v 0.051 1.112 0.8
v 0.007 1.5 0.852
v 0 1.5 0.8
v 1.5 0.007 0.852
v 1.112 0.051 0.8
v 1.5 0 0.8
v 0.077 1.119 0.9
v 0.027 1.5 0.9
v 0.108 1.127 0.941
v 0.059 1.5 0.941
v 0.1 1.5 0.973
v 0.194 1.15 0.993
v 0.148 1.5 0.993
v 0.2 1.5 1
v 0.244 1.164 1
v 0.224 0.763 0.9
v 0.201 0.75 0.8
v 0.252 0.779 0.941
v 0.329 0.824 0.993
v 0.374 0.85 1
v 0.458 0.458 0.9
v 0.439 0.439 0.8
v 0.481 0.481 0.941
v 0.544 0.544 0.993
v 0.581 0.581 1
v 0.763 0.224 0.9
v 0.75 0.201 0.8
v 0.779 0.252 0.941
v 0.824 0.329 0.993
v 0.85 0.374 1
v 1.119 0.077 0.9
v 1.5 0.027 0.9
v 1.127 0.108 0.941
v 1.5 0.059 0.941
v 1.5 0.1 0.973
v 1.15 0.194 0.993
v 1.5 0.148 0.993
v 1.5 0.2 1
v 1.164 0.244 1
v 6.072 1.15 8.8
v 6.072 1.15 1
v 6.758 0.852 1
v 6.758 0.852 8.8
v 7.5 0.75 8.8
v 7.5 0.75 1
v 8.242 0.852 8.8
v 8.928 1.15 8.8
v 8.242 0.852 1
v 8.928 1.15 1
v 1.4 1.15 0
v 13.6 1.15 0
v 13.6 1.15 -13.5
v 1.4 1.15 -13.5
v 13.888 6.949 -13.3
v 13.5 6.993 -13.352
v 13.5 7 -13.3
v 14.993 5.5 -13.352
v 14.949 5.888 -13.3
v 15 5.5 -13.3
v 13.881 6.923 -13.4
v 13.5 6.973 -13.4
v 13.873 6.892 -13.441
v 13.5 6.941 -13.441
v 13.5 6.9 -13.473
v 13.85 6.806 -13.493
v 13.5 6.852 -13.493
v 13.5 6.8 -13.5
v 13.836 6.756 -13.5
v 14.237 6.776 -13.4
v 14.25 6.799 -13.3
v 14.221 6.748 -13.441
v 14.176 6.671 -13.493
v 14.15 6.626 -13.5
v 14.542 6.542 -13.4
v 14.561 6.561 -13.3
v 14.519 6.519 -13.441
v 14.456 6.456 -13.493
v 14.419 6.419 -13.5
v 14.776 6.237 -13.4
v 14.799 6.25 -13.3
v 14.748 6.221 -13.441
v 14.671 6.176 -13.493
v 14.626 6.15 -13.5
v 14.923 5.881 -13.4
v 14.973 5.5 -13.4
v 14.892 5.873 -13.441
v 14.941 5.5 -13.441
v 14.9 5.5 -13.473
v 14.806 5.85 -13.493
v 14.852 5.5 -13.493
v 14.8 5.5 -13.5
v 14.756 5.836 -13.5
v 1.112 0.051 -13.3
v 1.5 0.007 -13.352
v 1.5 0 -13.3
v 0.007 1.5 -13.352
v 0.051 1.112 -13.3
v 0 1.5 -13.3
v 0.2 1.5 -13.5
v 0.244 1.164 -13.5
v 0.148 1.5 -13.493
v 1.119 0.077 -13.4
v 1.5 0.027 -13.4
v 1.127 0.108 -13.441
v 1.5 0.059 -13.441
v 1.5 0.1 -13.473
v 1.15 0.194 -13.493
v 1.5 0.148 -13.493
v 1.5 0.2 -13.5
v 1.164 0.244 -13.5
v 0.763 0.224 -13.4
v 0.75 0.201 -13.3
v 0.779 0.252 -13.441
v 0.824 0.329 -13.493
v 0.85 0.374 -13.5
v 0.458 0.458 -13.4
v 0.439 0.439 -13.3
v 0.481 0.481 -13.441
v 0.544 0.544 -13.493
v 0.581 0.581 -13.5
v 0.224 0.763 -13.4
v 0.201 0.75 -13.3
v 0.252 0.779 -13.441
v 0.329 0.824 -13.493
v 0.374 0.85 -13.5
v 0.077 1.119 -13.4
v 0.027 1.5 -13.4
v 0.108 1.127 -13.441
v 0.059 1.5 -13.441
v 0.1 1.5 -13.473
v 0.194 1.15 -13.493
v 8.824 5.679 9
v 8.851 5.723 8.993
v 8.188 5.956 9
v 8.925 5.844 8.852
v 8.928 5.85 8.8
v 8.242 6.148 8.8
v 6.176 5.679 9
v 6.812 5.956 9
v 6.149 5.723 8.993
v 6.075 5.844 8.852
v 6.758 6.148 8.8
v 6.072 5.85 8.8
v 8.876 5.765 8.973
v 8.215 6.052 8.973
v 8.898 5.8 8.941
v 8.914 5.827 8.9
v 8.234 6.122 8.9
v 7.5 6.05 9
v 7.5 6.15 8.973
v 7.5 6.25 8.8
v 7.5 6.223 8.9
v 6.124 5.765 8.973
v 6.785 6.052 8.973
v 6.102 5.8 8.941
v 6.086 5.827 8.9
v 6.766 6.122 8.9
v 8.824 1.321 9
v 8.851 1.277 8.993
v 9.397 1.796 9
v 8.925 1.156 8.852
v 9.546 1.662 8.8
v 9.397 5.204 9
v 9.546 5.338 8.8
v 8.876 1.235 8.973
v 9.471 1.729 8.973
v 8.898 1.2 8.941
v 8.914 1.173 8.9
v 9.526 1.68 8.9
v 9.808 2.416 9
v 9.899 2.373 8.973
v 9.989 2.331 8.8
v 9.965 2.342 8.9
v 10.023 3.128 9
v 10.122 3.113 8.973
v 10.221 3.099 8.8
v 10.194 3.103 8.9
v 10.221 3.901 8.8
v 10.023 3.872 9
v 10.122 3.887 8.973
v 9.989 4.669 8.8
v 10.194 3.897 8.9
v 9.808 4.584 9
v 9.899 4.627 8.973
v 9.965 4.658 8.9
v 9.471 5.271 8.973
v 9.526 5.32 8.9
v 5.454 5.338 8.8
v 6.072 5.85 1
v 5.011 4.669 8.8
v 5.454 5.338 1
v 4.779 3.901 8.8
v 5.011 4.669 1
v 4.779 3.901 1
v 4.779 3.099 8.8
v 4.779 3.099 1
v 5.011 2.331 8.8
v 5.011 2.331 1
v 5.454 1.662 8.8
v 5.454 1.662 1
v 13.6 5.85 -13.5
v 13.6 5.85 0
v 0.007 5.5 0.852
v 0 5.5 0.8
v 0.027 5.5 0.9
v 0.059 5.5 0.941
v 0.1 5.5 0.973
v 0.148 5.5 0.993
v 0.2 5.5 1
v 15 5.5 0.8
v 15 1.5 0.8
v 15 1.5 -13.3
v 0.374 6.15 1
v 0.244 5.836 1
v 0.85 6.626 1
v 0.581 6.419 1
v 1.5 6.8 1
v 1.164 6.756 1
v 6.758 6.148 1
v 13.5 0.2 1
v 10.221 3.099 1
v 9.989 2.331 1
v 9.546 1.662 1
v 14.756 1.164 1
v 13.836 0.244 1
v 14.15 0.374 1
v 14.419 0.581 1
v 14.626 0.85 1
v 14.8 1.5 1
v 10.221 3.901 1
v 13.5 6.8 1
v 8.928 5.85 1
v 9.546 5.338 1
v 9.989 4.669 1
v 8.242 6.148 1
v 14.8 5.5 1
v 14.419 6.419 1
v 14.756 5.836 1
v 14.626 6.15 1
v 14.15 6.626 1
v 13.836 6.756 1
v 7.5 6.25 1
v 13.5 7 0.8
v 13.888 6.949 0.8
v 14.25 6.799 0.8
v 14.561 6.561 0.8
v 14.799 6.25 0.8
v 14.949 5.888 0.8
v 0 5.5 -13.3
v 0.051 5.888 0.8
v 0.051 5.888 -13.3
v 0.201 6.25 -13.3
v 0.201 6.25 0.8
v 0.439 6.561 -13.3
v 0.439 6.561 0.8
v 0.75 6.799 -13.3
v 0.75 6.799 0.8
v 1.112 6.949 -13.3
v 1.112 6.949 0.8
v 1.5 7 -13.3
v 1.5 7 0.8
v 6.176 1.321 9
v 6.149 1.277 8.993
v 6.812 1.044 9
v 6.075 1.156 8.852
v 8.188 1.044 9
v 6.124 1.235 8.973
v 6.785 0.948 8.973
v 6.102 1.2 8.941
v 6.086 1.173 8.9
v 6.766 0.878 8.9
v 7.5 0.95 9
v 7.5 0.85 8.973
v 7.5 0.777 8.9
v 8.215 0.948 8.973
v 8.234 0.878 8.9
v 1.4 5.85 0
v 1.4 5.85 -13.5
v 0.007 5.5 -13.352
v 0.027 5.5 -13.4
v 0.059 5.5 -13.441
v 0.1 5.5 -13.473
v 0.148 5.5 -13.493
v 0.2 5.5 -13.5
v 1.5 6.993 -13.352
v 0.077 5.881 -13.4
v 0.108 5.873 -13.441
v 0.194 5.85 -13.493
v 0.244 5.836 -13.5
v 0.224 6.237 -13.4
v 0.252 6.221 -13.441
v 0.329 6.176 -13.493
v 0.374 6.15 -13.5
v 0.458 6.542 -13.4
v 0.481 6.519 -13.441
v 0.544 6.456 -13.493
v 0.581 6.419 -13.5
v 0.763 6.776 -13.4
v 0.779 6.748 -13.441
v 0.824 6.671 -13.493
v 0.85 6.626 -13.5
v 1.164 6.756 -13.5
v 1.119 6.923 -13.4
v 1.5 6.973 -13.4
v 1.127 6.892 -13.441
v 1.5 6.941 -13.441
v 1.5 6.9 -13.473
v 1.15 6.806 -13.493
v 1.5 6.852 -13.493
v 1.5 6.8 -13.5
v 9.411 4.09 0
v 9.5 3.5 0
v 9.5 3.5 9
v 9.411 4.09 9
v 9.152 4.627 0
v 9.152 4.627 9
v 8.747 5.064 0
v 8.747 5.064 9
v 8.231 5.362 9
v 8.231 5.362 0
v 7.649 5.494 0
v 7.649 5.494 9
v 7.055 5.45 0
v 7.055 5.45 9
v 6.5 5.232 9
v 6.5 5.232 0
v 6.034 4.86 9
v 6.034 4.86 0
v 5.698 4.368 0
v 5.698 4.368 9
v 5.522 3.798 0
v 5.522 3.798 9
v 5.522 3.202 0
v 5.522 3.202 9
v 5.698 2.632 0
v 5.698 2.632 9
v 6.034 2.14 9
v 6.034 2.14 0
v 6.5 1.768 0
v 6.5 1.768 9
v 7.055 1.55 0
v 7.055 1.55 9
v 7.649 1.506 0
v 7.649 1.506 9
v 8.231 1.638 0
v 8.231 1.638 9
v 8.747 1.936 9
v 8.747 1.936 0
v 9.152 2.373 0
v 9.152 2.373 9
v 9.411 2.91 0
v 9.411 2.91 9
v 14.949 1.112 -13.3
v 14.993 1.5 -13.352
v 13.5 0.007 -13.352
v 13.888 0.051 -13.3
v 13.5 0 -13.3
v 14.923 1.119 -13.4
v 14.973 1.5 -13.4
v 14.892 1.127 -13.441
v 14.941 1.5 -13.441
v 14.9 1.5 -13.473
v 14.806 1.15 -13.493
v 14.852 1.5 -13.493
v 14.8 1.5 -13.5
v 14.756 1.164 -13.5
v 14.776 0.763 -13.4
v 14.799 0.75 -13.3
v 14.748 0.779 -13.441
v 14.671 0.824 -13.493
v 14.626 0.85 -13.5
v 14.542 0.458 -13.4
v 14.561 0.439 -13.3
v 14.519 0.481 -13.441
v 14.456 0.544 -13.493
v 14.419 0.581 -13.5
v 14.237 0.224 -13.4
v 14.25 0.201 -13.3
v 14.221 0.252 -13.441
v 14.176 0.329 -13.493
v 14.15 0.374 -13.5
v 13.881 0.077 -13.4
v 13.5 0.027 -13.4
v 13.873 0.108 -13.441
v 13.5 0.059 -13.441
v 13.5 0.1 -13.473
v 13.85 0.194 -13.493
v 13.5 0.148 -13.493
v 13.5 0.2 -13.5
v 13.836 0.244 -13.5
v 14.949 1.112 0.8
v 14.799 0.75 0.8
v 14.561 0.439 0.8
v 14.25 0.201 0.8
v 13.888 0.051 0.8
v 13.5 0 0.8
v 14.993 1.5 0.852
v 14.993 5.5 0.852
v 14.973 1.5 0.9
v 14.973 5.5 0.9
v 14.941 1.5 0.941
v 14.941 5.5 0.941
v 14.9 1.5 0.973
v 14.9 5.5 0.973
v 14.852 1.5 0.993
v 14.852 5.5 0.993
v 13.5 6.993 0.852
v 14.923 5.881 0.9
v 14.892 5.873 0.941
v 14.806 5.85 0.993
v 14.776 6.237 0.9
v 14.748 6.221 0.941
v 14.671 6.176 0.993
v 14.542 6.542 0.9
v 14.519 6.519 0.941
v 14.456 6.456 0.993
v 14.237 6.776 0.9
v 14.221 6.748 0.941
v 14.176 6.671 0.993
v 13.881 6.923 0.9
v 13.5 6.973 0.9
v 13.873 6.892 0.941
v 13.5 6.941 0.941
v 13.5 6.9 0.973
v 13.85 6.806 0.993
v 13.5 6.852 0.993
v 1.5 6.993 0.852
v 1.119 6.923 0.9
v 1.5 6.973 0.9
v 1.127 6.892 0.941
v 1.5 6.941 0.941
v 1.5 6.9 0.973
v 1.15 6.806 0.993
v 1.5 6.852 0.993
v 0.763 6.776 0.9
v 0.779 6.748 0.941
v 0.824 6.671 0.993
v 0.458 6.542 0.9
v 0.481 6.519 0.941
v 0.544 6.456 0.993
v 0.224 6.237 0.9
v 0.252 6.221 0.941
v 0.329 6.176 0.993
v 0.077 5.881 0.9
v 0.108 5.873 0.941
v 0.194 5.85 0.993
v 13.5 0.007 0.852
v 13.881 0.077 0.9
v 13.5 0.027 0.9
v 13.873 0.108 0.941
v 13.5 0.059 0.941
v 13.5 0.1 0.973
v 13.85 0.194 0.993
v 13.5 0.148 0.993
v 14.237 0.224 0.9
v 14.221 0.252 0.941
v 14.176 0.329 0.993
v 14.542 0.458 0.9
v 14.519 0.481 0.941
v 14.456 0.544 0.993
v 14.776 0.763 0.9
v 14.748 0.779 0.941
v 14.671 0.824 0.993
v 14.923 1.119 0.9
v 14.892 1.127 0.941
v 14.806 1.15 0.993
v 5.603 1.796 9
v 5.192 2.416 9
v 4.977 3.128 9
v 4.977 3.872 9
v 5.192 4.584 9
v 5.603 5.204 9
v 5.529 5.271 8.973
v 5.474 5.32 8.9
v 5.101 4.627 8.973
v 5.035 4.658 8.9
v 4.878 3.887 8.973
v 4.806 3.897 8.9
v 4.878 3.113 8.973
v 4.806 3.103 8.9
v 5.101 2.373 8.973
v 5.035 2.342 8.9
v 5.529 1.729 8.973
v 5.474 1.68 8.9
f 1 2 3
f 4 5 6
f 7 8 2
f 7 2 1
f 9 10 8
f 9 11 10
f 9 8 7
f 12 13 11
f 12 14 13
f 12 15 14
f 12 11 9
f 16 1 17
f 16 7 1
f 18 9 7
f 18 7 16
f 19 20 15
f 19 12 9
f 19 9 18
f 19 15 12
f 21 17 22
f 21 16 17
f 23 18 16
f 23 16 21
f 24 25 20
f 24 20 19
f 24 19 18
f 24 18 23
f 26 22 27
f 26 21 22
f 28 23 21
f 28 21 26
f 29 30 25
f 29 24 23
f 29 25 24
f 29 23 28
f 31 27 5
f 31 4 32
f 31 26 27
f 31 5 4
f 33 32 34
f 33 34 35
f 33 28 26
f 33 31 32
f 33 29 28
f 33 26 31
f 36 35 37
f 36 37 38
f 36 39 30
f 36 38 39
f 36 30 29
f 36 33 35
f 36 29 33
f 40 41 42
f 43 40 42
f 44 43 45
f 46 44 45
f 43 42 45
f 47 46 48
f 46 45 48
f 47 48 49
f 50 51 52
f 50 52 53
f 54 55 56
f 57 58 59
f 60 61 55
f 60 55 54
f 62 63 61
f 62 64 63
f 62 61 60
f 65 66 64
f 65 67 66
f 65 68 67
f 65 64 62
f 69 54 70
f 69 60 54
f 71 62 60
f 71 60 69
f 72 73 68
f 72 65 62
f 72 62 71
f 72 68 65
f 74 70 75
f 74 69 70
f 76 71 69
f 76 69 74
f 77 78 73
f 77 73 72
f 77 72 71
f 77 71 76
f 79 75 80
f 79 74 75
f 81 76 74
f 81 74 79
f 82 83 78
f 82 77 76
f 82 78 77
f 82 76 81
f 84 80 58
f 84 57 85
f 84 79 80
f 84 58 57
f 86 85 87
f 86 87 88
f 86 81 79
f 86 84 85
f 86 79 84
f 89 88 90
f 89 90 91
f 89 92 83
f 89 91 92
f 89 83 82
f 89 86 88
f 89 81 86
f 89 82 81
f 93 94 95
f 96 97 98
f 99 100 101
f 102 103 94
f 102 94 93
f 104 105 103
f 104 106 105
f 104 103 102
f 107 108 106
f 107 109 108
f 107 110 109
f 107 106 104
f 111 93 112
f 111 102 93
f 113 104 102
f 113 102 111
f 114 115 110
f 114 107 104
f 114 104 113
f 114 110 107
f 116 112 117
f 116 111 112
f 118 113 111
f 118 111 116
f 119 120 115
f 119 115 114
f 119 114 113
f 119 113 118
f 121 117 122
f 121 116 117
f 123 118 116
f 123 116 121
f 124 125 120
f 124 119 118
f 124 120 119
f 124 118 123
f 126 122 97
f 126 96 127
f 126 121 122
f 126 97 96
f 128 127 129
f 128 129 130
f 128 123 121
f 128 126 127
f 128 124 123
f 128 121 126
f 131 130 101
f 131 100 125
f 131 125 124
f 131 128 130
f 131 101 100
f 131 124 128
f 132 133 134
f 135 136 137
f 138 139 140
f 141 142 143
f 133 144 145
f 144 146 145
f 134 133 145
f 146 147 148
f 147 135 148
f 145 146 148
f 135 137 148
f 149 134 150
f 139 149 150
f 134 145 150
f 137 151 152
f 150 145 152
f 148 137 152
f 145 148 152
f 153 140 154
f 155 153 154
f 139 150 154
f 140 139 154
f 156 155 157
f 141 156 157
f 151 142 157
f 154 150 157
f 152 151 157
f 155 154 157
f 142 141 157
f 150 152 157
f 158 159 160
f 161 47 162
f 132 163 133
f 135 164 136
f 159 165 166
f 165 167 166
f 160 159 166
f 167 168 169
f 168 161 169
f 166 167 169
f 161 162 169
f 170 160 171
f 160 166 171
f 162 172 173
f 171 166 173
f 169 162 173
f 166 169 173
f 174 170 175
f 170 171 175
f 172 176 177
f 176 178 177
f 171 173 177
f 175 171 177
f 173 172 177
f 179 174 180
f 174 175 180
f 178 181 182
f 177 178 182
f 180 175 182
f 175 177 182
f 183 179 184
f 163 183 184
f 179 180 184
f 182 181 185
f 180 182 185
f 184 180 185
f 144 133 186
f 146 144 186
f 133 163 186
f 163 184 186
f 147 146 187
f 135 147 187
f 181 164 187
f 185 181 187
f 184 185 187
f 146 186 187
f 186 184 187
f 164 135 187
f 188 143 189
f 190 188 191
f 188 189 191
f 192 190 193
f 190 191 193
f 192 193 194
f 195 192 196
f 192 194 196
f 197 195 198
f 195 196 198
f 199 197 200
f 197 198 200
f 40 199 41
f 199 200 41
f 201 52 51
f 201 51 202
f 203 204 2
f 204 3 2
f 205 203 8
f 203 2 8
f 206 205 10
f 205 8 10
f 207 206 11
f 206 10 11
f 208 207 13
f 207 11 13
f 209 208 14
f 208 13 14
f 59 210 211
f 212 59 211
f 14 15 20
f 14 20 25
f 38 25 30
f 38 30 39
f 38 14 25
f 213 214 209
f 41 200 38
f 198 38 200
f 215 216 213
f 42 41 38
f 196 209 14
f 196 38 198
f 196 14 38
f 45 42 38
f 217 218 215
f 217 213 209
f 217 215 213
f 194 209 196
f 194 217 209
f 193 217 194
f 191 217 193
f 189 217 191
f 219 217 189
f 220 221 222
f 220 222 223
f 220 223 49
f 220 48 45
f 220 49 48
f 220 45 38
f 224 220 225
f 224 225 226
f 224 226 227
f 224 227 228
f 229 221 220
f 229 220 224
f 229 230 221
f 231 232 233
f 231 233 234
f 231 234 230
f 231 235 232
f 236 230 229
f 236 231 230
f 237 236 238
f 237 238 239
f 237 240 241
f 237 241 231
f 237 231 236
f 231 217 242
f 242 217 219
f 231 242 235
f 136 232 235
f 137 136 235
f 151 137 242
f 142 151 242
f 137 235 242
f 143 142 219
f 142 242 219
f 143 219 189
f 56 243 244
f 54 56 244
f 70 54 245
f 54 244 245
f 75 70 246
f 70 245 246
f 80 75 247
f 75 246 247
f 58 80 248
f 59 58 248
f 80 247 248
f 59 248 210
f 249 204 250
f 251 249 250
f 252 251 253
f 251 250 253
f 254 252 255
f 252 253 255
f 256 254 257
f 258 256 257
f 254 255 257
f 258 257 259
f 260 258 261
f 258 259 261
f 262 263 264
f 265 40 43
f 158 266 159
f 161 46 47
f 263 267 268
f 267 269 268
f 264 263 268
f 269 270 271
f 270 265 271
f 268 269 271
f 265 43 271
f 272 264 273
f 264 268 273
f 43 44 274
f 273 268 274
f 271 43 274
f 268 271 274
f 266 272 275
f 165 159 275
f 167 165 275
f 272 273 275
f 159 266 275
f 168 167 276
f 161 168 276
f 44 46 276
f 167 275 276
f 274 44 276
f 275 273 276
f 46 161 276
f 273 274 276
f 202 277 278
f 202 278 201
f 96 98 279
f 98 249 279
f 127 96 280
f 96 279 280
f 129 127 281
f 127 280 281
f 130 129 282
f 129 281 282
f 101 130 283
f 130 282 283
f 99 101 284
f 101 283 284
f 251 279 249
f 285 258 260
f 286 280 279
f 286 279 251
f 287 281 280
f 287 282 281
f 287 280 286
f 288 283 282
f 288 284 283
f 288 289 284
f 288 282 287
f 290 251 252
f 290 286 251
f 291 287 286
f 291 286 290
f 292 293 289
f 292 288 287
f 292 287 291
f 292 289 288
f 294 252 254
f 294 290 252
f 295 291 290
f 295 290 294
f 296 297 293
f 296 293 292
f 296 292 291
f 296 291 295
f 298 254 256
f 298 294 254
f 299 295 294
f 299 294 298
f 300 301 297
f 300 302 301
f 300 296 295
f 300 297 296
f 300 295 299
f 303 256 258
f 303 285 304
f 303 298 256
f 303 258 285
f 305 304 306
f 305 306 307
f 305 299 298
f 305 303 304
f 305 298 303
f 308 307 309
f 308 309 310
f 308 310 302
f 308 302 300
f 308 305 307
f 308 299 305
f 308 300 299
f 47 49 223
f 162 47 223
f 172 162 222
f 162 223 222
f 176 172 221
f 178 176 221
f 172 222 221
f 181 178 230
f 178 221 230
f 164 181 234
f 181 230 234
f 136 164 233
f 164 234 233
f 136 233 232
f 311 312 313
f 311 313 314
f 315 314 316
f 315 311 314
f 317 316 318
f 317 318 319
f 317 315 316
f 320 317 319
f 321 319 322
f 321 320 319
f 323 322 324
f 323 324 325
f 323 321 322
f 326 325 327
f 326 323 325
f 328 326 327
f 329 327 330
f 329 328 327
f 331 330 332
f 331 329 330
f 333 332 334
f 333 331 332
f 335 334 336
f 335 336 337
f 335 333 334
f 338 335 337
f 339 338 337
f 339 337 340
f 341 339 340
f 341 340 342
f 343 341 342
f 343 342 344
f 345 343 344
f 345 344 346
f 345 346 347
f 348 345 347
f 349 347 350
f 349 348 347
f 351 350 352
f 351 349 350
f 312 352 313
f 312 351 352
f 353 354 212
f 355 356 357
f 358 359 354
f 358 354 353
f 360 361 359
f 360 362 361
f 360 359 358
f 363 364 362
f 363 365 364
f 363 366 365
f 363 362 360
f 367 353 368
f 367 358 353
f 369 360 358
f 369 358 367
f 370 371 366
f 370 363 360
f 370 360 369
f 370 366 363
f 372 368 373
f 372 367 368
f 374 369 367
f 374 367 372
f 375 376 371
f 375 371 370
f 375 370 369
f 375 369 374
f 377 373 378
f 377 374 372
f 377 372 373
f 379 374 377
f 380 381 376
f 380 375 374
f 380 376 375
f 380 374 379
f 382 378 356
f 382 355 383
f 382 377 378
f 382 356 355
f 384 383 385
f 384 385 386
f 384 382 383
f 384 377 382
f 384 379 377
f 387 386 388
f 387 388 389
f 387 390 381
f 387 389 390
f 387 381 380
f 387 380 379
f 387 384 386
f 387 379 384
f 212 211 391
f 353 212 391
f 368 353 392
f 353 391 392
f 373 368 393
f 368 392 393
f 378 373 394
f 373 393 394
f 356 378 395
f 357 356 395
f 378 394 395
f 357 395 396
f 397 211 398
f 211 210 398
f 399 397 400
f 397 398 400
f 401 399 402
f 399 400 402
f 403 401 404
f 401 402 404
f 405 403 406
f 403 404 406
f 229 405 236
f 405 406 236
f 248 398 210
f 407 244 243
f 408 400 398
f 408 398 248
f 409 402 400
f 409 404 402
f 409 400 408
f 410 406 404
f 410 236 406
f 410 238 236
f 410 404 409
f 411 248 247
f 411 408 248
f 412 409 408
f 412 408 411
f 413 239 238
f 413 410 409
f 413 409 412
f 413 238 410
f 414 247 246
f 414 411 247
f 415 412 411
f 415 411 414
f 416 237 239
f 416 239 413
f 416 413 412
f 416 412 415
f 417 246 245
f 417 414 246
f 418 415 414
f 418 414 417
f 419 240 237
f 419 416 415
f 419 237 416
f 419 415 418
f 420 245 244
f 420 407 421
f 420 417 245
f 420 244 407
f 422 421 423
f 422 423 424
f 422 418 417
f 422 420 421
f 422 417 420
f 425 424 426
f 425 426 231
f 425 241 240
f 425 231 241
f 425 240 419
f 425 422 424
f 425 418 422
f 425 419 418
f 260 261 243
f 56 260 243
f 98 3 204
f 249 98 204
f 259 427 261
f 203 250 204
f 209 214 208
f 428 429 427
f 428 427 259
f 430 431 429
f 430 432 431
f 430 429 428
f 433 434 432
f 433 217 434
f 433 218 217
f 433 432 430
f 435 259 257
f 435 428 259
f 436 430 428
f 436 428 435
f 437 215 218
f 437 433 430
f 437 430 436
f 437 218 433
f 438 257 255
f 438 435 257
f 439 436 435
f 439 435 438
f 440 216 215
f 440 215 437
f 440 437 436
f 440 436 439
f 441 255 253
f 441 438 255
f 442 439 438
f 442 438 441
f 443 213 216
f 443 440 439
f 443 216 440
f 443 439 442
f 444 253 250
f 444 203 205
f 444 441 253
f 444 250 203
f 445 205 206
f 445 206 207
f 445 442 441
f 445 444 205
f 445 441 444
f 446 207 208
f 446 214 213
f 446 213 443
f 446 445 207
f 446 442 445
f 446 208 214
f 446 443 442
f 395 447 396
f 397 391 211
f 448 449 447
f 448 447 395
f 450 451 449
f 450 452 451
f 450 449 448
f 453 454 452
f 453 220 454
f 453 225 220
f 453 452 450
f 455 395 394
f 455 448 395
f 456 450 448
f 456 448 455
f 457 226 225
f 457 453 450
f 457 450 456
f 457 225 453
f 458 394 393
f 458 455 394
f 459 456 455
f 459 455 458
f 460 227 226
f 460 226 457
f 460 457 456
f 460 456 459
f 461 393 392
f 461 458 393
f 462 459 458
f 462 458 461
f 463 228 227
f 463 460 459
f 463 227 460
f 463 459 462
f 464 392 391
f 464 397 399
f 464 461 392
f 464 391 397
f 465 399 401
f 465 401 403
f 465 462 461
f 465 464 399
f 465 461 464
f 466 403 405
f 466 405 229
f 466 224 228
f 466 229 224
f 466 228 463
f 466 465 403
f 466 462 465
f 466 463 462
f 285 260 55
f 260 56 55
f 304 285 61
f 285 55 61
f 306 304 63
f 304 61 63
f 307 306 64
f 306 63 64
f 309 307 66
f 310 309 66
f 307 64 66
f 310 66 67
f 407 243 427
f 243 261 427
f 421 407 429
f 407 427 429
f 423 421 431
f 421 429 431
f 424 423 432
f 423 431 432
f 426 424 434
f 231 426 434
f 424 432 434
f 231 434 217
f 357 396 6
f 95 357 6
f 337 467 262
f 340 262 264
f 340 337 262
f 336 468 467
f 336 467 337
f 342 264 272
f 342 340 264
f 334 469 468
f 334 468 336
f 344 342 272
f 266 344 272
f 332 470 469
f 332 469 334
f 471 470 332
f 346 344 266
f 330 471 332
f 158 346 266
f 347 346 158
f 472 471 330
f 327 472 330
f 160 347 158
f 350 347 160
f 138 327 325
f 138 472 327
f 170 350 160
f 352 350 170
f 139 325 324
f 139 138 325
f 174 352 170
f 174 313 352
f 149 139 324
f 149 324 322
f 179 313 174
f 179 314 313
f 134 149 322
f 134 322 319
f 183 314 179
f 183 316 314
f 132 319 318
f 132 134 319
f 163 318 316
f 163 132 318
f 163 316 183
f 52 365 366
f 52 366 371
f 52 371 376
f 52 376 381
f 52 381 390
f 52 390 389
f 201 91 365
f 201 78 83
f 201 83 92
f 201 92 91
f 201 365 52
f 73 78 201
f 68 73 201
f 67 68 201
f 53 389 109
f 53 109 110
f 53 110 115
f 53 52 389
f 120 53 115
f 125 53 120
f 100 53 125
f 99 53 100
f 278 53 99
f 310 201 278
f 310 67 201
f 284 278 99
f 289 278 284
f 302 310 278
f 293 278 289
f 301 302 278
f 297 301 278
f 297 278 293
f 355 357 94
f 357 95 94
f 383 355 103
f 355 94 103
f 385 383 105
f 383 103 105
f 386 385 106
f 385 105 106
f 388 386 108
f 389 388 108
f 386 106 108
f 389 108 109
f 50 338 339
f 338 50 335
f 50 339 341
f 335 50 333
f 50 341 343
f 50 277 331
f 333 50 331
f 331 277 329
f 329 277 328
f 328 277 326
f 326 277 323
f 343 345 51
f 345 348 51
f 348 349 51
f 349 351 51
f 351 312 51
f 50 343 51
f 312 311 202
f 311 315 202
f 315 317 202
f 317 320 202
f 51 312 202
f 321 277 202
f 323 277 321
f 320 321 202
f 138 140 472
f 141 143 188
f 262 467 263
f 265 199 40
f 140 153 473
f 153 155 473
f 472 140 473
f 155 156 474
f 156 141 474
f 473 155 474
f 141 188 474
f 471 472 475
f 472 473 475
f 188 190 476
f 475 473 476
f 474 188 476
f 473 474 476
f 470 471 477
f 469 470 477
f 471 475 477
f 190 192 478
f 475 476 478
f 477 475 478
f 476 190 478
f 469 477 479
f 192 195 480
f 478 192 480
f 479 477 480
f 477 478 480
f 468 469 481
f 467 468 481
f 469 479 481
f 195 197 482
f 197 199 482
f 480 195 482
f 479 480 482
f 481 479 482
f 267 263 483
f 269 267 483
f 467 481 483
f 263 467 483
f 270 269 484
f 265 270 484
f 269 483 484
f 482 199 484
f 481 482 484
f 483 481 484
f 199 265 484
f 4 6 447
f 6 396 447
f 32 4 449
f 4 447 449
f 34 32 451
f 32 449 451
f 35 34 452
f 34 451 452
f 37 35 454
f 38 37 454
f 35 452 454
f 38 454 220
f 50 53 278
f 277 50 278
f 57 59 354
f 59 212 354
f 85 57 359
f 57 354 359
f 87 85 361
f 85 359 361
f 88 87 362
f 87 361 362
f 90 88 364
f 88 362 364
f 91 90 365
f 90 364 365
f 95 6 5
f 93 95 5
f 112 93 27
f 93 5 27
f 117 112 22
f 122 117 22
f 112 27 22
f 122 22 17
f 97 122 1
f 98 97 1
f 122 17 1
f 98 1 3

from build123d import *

# Parameters (mm, degrees)
SKETCH_1_R      = 2.75
SKETCH_1_R_2    = 2
EXTRUDE_1_DEPTH = 9
SKETCH_1_6_R    = 2.75
EXTRUDE_4_DEPTH = 1
SKETCH_1_7_W    = 12.2
SKETCH_1_7_H    = 4.7
EXTRUDE_5_DEPTH = 13.5
FILLET_1_R      = 0.2


with BuildPart() as part:
    # Sketch 1 → Extrude 1 (new body)
    with BuildSketch(Plane.XY):
        with Locations((7.5, 3.5)):
            Circle(SKETCH_1_R)
        with Locations((7.5, 3.5)):
            Circle(SKETCH_1_R_2, mode=Mode.SUBTRACT)
        with BuildLine():
            ThreePointArc((8.928285686, 5.85), (7.5, 6.25), (6.071714314, 5.85))
            Line((6.071714314, 5.85), (8.928285686, 5.85))
        make_face()
        with BuildLine():
            Line((8.928285686, 1.15), (6.071714314, 1.15))
            ThreePointArc((6.071714314, 1.15), (7.5, 0.75), (8.928285686, 1.15))
        make_face()
    extrude(amount=EXTRUDE_1_DEPTH)

    # Sketch 1_6 → Extrude 4 (add)
    with BuildSketch(Plane.XY):
        with BuildLine():
            ThreePointArc((0, 1.5), (0.439339828, 0.439339828), (1.5, 0))
            Line((1.5, 0), (13.5, 0))
            ThreePointArc((13.5, 0), (14.560660172, 0.439339828), (15, 1.5))
            Line((15, 1.5), (15, 5.5))
            ThreePointArc((15, 5.5), (14.560660172, 6.560660172), (13.5, 7))
            Line((13.5, 7), (1.5, 7))
            ThreePointArc((1.5, 7), (0.439339828, 6.560660172), (0, 5.5))
            Line((0, 5.5), (0, 1.5))
        make_face()
        with Locations((7.5, 3.5)):
            Circle(SKETCH_1_6_R, mode=Mode.SUBTRACT)
    extrude(amount=EXTRUDE_4_DEPTH)

    # Sketch 1_7 → Extrude 5 (add)
    with BuildSketch(Plane.XY):
        with BuildLine():
            ThreePointArc((0, 5.5), (0.439339828, 6.560660172), (1.5, 7))
            Line((1.5, 7), (13.5, 7))
            ThreePointArc((13.5, 7), (14.560660172, 6.560660172), (15, 5.5))
            Line((15, 5.5), (15, 1.5))
            ThreePointArc((15, 1.5), (14.560660172, 0.439339828), (13.5, 0))
            Line((13.5, 0), (1.5, 0))
            ThreePointArc((1.5, 0), (0.439339828, 0.439339828), (0, 1.5))
            Line((0, 1.5), (0, 5.5))
        make_face()
        with Locations((7.5, 3.5)):
            Rectangle(SKETCH_1_7_W, SKETCH_1_7_H, mode=Mode.SUBTRACT)
        with BuildLine():
            ThreePointArc((8.928285686, 5.85), (7.5, 6.25), (6.071714314, 5.85))
            Line((6.071714314, 5.85), (8.928285686, 5.85))
        make_face()
        with BuildLine():
            Line((8.928285686, 1.15), (6.071714314, 1.15))
            ThreePointArc((6.071714314, 1.15), (7.5, 0.75), (8.928285686, 1.15))
        make_face()
    extrude(amount=-EXTRUDE_5_DEPTH)

    # Fillet 1
    fillet_1_edges = [part.edges().sort_by_distance(p)[0] for p in [
        (0.439339828, 6.560660172, 1),
        (0, 3.5, 1),
        (0.439339828, 0.439339828, 1),
        (14.560660172, 6.560660172, 1),
        (7.5, 7, 1),
        (7.5, 0, 1),
        (14.560660172, 0.439339828, 1),
        (15, 3.5, 1),
        (15, 3.5, -13.5),
        (14.560660172, 0.439339828, -13.5),
        (7.5, 0, -13.5),
        (0.439339828, 6.560660172, -13.5),
        (7.5, 7, -13.5),
        (14.560660172, 6.560660172, -13.5),
        (0.439339828, 0.439339828, -13.5),
        (0, 3.5, -13.5),
        (9.896902755, 2.151906093, 9),
    ]]
    fillet(fillet_1_edges, radius=FILLET_1_R)


solid = part.part
